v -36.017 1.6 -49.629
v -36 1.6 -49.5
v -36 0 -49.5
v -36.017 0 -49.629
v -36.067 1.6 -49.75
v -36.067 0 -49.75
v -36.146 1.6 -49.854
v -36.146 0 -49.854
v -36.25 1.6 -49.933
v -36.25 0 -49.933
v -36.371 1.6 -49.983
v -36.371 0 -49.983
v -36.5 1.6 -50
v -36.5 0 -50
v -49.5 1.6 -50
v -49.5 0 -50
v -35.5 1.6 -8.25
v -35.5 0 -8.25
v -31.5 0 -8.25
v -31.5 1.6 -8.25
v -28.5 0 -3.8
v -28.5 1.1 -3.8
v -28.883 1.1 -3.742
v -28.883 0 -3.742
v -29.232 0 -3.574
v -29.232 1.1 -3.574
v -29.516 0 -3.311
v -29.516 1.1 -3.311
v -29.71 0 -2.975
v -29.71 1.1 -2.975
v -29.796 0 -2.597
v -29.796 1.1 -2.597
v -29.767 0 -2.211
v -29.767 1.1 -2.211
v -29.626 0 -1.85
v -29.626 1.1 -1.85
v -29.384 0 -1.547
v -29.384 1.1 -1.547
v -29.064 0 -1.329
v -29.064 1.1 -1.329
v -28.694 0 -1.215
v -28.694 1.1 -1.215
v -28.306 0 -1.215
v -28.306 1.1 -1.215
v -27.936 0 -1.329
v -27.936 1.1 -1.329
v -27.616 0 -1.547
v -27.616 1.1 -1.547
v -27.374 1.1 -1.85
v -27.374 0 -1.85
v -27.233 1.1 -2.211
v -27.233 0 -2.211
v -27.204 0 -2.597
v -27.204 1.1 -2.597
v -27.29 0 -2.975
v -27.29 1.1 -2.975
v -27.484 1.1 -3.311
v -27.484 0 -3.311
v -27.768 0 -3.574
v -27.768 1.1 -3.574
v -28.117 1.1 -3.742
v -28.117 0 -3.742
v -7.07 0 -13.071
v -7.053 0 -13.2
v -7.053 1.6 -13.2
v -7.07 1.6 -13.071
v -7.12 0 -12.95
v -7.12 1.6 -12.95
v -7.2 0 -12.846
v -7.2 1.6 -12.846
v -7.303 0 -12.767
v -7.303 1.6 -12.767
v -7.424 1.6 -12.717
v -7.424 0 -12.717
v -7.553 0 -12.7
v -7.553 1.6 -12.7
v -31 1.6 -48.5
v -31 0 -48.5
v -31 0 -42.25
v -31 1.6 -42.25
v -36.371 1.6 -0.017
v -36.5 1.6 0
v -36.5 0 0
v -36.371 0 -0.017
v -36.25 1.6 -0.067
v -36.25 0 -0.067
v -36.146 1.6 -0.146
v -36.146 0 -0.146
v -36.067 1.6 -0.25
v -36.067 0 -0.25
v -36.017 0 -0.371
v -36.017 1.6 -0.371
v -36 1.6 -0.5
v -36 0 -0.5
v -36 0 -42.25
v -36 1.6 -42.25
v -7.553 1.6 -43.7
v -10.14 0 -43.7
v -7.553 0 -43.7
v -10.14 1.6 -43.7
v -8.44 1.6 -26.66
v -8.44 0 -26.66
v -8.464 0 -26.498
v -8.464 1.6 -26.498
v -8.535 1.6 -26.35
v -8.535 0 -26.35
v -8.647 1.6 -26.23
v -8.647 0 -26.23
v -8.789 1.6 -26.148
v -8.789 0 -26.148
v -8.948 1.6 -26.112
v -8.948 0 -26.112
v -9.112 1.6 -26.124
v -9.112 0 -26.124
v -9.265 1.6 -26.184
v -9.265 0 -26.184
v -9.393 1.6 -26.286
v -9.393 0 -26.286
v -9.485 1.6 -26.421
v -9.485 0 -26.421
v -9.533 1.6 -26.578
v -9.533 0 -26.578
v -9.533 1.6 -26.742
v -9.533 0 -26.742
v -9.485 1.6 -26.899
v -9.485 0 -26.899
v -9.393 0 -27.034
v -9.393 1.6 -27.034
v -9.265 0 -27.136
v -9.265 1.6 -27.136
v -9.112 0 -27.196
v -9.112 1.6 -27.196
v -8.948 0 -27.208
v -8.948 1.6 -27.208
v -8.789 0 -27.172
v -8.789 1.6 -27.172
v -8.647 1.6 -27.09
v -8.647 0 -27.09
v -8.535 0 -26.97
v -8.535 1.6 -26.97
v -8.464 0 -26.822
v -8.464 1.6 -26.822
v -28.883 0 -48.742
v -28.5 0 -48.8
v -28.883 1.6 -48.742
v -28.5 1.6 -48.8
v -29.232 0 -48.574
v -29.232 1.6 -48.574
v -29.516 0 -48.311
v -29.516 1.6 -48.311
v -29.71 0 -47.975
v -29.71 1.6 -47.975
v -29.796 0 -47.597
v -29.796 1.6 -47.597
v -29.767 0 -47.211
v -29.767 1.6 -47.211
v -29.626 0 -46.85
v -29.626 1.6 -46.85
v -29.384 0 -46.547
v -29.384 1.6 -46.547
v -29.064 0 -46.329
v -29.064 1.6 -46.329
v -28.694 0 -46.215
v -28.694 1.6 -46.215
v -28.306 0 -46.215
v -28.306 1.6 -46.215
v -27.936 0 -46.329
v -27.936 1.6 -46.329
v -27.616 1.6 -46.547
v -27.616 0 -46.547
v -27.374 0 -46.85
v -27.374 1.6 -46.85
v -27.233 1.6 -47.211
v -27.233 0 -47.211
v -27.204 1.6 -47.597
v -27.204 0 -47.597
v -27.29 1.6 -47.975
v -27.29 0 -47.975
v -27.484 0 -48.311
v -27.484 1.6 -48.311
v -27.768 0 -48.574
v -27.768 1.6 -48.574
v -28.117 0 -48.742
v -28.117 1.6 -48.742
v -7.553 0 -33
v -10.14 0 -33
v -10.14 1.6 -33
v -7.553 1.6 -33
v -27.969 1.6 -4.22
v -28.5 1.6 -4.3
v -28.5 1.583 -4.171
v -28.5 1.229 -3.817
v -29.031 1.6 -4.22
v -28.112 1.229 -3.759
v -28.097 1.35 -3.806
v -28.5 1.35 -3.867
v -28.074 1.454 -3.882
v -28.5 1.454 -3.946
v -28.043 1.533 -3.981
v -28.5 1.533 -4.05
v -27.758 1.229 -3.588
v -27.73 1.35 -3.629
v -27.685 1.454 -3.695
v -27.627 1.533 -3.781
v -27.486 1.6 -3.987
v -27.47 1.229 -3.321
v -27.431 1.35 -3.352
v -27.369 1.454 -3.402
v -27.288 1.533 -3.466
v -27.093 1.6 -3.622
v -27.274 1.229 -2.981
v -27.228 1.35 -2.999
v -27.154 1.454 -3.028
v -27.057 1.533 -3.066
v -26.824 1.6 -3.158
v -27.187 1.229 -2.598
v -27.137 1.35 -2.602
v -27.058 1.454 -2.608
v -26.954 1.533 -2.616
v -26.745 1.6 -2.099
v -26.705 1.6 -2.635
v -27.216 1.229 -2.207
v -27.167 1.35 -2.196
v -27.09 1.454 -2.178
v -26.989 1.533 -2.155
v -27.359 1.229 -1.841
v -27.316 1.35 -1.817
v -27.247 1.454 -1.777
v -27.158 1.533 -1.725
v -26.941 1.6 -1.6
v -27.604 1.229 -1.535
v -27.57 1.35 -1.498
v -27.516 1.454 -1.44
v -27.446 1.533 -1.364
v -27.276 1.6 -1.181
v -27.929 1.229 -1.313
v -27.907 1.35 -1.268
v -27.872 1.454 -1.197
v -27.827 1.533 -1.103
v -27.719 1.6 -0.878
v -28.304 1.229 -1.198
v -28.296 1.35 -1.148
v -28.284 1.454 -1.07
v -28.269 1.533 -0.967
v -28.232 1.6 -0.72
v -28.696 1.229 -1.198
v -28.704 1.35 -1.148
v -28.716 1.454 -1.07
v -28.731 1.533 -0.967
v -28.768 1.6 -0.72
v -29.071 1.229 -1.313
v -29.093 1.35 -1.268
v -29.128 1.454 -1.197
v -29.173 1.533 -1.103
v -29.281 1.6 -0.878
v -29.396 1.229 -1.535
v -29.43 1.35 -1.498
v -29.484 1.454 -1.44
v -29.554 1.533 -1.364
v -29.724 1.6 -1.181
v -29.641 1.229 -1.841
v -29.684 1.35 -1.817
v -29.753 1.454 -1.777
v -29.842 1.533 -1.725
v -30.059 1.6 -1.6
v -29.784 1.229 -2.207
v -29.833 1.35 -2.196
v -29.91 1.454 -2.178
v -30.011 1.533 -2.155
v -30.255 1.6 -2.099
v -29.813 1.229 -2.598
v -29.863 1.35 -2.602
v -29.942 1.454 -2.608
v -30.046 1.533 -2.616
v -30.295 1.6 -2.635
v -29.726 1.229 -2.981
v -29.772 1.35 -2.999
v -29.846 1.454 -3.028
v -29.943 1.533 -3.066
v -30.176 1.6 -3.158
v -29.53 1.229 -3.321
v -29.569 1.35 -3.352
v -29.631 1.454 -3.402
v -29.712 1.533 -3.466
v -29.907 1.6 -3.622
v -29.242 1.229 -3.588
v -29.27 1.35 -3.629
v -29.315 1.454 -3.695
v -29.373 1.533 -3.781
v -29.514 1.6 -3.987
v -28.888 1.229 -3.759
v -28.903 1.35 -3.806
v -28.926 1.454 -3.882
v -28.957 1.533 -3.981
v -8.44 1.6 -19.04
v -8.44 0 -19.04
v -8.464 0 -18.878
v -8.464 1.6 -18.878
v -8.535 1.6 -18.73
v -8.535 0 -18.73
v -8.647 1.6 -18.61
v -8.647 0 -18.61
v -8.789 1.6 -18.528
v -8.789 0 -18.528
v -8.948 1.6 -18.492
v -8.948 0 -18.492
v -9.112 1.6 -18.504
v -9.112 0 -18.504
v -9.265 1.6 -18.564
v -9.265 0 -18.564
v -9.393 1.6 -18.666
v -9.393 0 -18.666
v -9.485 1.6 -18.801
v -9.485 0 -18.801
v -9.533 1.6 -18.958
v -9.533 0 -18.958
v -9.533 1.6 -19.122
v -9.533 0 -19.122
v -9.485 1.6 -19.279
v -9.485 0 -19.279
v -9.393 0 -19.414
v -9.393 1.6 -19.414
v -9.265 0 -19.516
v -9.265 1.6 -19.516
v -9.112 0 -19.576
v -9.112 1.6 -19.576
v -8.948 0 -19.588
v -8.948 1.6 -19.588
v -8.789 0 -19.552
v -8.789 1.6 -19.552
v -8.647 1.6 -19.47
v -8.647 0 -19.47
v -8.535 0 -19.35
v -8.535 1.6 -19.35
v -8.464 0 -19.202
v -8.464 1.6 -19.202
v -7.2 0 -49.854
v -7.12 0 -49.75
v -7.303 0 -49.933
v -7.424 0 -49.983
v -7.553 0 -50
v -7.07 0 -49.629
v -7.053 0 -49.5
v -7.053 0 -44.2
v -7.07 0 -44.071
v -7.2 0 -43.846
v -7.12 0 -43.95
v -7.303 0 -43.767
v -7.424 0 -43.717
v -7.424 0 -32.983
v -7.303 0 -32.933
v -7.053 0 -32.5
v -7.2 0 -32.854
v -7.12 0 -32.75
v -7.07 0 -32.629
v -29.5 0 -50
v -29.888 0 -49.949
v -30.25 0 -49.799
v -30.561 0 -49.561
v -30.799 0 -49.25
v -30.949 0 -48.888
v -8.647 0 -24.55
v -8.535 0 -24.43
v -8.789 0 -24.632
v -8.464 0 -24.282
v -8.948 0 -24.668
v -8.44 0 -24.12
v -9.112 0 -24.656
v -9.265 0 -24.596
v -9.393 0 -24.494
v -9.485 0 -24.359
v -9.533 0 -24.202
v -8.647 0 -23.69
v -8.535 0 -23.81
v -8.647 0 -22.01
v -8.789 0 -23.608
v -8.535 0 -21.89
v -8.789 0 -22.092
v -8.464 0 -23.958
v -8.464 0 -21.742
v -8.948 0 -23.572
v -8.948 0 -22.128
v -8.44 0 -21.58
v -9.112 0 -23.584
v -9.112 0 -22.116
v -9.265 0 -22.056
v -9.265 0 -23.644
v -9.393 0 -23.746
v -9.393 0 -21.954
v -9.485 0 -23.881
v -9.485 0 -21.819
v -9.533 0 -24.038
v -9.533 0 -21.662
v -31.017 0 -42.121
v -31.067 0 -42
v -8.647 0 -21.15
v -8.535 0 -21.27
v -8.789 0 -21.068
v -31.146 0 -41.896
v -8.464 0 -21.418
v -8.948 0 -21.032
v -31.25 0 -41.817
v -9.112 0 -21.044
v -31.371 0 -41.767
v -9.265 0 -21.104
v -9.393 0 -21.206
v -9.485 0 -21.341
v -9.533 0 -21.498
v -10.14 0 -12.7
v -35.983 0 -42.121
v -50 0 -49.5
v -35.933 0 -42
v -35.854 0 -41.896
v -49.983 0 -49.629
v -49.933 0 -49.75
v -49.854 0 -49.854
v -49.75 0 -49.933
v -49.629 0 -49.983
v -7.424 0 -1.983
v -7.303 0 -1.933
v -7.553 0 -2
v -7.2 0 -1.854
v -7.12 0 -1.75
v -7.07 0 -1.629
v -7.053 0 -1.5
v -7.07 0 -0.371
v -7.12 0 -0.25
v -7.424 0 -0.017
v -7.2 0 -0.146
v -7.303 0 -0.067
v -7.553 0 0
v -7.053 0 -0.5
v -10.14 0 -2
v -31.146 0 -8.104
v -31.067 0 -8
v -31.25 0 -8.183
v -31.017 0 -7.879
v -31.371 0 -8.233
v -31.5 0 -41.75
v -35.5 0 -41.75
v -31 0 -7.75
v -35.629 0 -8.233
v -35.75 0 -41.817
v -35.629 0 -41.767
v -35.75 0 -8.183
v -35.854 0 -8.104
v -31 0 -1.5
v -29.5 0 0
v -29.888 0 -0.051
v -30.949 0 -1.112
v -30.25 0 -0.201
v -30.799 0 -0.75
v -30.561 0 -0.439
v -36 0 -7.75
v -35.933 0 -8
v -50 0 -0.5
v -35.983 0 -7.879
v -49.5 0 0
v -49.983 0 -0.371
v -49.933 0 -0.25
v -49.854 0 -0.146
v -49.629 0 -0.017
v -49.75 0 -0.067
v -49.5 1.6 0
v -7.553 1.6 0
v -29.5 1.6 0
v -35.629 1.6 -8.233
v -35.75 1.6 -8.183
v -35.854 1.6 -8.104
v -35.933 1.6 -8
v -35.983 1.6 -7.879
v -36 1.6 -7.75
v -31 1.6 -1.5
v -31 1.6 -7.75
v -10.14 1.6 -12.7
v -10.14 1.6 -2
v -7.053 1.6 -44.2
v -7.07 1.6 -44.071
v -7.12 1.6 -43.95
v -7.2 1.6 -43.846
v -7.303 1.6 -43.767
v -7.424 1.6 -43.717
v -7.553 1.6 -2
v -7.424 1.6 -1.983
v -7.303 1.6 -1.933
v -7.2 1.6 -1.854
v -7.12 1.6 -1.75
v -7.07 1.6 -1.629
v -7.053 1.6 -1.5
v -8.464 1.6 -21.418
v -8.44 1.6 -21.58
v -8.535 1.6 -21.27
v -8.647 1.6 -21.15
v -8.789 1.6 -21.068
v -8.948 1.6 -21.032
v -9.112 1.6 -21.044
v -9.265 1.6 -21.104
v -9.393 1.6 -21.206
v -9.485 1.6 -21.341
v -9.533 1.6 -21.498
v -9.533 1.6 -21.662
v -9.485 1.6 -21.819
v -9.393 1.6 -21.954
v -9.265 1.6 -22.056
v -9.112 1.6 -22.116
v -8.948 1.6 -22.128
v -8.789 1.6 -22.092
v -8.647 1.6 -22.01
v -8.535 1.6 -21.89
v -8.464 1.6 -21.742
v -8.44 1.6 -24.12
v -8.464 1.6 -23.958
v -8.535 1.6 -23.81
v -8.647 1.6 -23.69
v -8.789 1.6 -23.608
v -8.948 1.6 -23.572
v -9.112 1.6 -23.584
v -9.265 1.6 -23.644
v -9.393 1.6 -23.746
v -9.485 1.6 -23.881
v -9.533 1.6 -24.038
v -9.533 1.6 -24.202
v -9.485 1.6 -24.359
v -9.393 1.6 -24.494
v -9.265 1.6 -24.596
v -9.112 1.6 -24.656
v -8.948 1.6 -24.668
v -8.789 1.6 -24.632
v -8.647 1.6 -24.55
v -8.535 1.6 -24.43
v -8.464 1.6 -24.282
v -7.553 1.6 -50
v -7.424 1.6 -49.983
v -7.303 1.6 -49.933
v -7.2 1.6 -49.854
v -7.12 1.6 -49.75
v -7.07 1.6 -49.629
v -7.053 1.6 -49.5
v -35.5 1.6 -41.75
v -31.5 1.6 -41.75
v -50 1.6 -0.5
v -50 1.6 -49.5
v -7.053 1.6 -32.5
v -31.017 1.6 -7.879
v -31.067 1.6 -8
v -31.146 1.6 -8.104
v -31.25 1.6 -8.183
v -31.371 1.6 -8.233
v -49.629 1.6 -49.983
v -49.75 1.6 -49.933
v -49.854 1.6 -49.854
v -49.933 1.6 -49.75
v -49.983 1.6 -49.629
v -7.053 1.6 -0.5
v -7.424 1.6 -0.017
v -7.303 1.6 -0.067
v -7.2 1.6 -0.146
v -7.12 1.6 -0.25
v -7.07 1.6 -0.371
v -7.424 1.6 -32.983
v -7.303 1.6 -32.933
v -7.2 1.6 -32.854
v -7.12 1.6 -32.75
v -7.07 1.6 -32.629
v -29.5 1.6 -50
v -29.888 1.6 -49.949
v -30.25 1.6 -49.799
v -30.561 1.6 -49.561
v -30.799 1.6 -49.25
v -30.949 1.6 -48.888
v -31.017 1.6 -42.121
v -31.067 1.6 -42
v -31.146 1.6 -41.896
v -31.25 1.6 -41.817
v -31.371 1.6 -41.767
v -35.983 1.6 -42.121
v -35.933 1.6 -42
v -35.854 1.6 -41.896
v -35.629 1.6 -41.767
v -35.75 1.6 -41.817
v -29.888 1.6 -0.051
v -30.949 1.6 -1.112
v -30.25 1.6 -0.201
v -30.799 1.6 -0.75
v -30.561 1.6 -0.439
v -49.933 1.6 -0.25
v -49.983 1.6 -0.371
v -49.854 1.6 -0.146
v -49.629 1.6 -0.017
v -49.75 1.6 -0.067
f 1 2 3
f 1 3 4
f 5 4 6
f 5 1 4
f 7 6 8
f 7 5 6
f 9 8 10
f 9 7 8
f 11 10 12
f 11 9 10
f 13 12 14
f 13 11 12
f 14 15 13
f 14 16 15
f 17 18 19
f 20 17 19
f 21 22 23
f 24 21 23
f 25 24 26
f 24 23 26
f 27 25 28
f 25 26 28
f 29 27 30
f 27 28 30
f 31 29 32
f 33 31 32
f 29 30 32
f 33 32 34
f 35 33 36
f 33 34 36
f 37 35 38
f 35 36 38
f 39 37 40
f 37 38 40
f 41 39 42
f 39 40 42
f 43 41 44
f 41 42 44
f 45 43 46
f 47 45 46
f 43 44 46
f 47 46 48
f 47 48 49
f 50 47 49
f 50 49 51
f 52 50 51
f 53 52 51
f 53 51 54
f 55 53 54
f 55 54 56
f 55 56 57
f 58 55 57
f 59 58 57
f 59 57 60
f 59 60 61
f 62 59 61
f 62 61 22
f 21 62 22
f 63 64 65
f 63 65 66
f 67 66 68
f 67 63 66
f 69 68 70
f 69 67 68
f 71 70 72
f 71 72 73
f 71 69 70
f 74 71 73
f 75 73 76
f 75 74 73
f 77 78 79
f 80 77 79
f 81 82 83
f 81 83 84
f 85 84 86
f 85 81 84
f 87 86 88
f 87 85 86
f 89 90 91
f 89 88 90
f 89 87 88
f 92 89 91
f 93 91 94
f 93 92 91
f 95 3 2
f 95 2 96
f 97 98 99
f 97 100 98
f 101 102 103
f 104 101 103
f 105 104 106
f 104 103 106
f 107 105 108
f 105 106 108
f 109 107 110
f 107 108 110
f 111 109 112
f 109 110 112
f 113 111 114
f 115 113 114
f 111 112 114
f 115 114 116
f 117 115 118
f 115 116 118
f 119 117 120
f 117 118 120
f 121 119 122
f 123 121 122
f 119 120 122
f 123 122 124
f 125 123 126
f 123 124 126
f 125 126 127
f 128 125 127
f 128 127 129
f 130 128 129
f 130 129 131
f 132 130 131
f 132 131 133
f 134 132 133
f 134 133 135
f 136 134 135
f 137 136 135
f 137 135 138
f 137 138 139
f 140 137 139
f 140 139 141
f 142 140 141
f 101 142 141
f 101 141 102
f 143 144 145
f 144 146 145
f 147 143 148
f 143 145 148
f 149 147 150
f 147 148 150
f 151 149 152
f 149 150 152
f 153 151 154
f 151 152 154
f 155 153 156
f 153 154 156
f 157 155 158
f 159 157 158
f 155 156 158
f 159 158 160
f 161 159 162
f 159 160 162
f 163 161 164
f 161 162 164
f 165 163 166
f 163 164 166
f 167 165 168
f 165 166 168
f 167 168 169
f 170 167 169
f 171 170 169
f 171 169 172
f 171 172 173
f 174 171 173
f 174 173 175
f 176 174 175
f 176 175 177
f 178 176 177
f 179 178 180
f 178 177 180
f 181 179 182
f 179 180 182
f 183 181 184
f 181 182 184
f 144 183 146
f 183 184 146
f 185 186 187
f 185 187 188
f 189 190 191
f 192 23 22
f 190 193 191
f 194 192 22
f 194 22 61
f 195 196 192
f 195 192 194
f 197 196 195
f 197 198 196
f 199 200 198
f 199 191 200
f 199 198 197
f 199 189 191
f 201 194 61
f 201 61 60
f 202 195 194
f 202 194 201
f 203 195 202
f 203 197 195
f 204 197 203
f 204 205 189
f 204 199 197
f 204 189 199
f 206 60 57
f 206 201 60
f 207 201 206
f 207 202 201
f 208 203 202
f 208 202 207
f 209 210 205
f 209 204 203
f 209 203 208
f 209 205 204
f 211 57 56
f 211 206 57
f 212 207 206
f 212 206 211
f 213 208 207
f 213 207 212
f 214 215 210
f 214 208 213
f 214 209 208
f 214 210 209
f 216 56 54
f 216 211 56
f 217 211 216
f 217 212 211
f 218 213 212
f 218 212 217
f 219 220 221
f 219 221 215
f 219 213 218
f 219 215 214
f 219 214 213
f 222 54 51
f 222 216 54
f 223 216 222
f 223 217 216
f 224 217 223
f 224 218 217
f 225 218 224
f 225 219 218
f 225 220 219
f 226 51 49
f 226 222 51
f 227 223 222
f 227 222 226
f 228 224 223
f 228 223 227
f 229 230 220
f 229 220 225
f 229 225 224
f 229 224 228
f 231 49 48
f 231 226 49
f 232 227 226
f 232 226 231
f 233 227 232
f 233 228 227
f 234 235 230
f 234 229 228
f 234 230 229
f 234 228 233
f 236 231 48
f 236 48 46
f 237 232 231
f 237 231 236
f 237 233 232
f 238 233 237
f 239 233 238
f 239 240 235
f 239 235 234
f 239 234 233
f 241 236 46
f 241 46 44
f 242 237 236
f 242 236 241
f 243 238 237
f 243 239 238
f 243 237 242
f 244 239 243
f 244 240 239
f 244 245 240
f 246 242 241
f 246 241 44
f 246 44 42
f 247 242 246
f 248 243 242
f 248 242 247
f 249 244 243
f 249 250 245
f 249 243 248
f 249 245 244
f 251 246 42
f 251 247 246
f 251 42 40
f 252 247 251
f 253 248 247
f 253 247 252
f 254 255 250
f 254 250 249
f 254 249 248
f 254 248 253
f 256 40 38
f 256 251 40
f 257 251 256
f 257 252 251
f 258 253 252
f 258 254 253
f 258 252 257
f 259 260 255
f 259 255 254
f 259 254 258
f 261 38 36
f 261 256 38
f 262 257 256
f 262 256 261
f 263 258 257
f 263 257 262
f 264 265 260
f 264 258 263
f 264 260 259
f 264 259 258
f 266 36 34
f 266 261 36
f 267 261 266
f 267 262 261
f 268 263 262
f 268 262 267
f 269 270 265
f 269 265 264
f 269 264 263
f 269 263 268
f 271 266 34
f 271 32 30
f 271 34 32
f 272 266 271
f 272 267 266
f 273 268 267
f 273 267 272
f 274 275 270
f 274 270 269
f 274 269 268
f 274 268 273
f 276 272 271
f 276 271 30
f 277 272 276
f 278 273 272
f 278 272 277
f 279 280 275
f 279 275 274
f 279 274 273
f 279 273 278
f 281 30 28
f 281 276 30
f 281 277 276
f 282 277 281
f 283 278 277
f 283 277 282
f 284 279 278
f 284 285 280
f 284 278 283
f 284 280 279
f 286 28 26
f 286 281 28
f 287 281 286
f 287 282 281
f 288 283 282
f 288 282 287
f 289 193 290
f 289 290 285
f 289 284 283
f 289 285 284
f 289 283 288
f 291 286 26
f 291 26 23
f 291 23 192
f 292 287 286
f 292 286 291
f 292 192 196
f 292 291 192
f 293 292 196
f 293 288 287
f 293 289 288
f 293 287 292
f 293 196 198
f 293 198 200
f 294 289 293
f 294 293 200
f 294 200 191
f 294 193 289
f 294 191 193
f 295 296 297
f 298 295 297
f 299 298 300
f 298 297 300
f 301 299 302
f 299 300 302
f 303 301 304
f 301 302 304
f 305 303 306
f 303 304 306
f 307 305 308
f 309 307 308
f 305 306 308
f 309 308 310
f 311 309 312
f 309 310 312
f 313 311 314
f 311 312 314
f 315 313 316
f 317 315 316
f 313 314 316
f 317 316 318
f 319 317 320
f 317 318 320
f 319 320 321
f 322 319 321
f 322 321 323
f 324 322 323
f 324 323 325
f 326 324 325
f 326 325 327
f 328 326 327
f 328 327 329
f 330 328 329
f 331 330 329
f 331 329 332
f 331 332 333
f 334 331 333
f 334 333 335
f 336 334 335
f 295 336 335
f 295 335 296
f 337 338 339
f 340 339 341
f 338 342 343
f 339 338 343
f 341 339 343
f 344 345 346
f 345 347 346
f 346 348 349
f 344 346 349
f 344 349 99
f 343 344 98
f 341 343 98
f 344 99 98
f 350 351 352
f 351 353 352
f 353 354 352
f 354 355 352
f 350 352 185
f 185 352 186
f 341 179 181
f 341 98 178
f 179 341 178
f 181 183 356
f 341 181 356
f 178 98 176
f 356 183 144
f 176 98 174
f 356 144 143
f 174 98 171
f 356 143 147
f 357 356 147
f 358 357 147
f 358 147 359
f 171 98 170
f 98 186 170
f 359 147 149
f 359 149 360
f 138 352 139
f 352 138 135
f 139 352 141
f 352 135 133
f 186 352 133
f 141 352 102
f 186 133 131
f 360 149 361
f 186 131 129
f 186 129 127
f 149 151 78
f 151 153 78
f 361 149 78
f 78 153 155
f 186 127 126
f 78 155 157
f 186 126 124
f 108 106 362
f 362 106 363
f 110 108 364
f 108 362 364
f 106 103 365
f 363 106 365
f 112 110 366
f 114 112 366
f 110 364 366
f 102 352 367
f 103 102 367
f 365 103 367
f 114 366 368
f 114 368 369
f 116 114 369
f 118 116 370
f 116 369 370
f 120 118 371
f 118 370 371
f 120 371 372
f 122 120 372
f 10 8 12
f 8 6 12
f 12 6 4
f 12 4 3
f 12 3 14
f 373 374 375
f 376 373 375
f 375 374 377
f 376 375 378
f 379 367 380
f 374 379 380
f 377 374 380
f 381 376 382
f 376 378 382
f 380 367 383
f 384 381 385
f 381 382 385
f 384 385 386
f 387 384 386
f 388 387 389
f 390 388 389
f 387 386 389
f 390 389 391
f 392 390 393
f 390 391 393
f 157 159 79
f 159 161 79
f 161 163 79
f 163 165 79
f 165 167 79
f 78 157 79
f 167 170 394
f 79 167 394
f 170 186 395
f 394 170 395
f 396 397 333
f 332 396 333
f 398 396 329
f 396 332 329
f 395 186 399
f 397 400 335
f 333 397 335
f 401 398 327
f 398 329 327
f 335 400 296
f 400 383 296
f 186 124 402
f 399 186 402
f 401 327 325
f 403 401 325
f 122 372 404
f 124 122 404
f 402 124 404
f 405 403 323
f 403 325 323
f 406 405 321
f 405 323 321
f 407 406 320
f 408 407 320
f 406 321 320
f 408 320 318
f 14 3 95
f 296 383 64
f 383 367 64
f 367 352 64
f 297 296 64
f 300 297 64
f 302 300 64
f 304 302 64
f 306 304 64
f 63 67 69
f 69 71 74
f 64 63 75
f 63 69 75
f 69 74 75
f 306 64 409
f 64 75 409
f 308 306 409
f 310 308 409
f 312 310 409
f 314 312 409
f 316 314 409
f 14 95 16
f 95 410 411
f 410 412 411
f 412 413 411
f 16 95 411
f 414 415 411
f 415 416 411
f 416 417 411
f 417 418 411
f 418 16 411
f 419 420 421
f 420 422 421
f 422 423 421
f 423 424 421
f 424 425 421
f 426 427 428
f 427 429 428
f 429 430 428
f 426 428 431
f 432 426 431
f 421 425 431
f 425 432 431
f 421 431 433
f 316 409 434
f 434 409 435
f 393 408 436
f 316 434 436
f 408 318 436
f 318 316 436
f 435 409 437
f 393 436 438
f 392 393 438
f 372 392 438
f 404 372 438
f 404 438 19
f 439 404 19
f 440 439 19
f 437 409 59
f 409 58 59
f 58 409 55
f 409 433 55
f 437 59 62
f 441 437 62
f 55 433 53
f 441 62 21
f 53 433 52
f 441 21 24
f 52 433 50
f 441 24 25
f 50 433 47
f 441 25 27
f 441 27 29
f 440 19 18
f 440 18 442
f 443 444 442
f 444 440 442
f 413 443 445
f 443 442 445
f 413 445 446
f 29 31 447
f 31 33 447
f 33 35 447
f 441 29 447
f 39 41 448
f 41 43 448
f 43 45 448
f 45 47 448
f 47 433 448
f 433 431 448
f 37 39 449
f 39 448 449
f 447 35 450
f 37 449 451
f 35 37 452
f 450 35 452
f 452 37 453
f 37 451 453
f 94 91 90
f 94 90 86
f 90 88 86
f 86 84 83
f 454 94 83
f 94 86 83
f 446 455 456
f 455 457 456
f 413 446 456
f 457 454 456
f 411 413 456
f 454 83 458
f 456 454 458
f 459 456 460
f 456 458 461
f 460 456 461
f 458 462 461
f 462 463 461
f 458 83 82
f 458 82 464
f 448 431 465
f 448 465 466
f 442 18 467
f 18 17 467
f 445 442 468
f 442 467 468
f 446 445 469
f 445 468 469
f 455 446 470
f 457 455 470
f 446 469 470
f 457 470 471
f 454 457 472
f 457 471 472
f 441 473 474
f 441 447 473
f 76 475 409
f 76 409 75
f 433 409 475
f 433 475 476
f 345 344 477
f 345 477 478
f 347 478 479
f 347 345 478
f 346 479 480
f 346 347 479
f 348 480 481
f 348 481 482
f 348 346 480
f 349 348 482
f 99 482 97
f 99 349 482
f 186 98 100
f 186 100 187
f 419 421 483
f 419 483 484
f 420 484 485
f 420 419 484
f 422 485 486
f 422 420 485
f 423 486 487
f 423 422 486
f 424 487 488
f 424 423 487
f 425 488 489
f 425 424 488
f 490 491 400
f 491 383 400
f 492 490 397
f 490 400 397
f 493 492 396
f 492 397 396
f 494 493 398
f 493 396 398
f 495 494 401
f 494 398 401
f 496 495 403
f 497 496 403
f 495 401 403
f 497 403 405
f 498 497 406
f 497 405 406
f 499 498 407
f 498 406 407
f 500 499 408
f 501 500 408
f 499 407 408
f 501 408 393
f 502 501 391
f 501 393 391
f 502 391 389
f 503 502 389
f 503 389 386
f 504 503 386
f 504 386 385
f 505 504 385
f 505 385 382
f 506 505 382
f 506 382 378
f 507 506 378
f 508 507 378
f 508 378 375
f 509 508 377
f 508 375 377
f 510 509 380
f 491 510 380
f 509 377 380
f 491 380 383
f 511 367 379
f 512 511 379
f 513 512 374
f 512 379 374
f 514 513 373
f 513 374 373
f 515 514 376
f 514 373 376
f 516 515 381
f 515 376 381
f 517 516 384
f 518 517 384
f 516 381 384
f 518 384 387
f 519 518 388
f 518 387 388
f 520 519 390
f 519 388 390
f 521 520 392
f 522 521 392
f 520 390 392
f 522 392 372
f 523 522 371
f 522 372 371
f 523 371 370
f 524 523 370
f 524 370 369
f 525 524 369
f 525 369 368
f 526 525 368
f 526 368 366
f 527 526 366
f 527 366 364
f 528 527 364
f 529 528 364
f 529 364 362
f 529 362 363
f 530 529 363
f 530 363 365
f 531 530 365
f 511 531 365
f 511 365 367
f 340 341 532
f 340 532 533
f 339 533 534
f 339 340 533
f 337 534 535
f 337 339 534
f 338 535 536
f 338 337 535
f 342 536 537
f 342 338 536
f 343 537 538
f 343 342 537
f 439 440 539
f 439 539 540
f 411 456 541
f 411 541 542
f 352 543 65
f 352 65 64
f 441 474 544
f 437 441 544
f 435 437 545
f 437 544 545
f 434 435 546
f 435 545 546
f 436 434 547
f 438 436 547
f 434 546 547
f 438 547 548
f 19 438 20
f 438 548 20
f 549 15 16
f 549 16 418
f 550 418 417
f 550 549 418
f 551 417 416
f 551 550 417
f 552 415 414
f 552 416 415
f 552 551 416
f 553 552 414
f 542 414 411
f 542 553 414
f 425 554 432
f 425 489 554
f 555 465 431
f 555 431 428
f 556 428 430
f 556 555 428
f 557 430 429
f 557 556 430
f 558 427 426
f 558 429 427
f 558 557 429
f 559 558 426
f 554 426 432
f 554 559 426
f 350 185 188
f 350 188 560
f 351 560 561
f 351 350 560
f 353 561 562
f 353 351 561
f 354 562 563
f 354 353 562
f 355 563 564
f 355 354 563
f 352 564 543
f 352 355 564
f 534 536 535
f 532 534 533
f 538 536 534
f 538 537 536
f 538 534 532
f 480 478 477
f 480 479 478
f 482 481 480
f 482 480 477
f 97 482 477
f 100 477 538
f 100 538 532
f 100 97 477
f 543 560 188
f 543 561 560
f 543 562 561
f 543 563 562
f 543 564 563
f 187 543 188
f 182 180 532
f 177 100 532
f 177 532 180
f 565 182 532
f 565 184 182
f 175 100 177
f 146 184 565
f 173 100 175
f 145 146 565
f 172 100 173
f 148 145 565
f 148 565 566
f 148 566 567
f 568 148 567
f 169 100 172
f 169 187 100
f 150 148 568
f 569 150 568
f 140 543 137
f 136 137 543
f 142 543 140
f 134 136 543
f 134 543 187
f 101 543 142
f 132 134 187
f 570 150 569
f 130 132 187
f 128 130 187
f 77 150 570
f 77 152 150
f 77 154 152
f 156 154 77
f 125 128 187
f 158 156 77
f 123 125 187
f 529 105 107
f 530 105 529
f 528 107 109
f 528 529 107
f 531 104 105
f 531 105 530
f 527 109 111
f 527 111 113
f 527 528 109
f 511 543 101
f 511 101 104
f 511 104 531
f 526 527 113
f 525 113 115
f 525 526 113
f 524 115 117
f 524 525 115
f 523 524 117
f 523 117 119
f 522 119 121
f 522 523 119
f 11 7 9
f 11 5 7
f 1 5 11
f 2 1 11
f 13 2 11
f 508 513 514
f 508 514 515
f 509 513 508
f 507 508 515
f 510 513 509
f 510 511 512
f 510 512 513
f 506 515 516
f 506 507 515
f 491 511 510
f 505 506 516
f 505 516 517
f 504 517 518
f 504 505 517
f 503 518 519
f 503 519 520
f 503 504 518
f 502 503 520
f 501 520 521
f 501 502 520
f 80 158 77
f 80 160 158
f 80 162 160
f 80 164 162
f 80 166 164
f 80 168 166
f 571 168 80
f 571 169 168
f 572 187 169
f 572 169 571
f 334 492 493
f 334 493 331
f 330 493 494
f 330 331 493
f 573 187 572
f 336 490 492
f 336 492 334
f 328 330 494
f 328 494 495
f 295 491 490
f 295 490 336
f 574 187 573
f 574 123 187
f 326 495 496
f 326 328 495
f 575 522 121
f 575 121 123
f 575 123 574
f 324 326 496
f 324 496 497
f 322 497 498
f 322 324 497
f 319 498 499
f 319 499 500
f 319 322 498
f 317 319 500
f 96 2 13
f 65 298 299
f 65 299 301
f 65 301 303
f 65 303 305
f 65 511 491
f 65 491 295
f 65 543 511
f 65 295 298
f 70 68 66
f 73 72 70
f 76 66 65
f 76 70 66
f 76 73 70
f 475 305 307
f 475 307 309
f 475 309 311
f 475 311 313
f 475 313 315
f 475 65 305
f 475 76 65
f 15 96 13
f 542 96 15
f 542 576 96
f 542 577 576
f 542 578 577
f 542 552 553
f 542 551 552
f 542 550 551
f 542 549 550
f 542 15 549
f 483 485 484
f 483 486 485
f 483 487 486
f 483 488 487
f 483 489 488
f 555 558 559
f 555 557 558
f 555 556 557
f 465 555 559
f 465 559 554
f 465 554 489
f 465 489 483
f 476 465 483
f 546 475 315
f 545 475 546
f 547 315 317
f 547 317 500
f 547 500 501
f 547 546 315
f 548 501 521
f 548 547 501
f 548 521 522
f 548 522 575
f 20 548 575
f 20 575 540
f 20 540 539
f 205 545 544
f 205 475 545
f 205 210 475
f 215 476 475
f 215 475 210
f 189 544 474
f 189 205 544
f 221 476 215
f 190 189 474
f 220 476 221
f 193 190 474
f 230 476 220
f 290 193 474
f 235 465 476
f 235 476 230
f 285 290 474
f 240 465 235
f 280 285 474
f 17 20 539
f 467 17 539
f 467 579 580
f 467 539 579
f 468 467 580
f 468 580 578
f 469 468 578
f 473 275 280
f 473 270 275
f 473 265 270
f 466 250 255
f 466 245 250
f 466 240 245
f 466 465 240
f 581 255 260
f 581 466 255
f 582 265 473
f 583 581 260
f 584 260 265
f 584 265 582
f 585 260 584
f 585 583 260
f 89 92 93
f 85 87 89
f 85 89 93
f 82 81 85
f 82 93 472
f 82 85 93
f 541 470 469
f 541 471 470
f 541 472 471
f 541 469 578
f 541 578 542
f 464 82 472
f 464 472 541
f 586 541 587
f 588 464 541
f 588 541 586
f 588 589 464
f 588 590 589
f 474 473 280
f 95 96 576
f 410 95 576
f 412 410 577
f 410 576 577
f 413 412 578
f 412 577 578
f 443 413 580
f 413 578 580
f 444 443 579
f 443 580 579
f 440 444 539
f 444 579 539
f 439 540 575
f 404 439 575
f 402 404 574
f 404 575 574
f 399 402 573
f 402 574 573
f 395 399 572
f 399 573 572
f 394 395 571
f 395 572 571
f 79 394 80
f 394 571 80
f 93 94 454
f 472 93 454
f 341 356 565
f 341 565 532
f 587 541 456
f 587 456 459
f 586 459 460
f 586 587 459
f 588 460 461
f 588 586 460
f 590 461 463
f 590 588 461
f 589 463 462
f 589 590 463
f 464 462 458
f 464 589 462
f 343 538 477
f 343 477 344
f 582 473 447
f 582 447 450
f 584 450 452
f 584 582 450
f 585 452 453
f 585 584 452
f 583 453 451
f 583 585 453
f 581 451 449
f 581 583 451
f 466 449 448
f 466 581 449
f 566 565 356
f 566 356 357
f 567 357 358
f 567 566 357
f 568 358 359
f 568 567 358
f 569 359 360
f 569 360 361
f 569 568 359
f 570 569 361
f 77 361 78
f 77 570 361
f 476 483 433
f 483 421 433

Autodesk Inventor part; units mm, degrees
ref_plane "YZ Plane" through (0, 0, 0) normal (1, 0, 0) x (0, 1, 0)
ref_plane "XZ Plane" through (0, 0, 0) normal (0, 1, 0) x (-1, 0, 0)
ref_plane "XY Plane" through (0, 0, 0) normal (0, 0, 1) x (1, 0, 0)
sketch "Szkic1" plane through (0, 0, 0) normal (0, 1, 0) x (-1, 0, 0)
  line L0 (0, 0) -> (50, 0)
  line L1 (50, 0) -> (50, -50)
  line L2 (50, -50) -> (0, -50)
  line L3 (0, -50) -> (0, 0)
  dimension "d0" = 50
  dimension "d1" = 50
extrude "Wyciągnięcie proste1" add sketch "Szkic1" along normal blind 1.6
sketch "Szkic2" plane through (-50, 0, 0) normal (0, 0, 1) x (1, 0, 0)
  line L0 (0, 0) -> (50, 0) projected
  line L1 (50, 0) -> (50, 1.6) projected
  line L2 (0, 1.6) -> (50, 1.6) projected
  line L3 (0, 0) -> (0, 1.6) projected
  line L4 (47.9294, 17.85) -> (42.5705, -2.15) projected
  line L5 (42.5705, -2.15) -> (44.641, -2.15) projected
  line L6 (44.641, -2.15) -> (50, 17.85) projected
  line L7 (50, 17.85) -> (47.9294, 17.85) projected
  point P0 (43.5753, 1.6)
  point P1 (43.1466, 0)
extrude "Wyciągnięcie proste2" cut sketch "Szkic2" against normal through all contours L4 L2 L6 L0 | L6 L2 L1 L0
sketch "Szkic3" plane through (0, 0, 0) normal (0, -1, 0) x (1, 0, 0)
  line L0 (-8.5941, -2) -> (-8.5941, -12.7) projected
  line L1 (-8.5941, -2) -> (-10.1396, -2) projected
  line L2 (-10.1396, -12.7) -> (-10.1396, -2) projected
  line L3 (-8.5941, -12.7) -> (-10.1396, -12.7) projected
  line L4 (-10.1396, -12.7) -> (-7.8396, -12.7)
  line L5 (-7.8396, -12.7) -> (-7.8396, -2)
  line L6 (-7.8396, -2) -> (-10.1396, -2)
  line L7 (-10.1396, -2) -> (-10.1396, -12.7)
  line L8 (-8.5941, -33) -> (-8.5941, -43.7) projected
  line L9 (-8.5941, -33) -> (-10.1396, -33) projected
  line L10 (-10.1396, -43.7) -> (-10.1396, -33) projected
  line L11 (-8.5941, -43.7) -> (-10.1396, -43.7) projected
  line L12 (-10.1396, -33) -> (-7.8396, -33)
  line L13 (-7.8396, -33) -> (-7.8396, -43.7)
  line L14 (-7.8396, -43.7) -> (-10.1396, -43.7)
  line L15 (-10.1396, -43.7) -> (-10.1396, -33)
  point P0 (0, 0)
  dimension "d6" = 2.3
  dimension "d7" = 2.3
extrude "Wyciągnięcie proste3" cut sketch "Szkic3" against normal through all
sketch "Szkic4" plane through (0, 0, 0) normal (0, -1, 0) x (1, 0, 0)
  line L0 (-10.1396, -33) -> (-7.8396, -33) projected
  line L1 (-7.8396, -12.7) -> (-10.1396, -12.7) projected
  line L2 (-8.9896, -12.7) -> (-8.9896, -33) construction
  circle A0 centre (-8.9896, -26.66) radius 0.55
  circle A1 centre (-8.9896, -24.12) radius 0.55
  circle A2 centre (-8.9896, -21.58) radius 0.55
  circle A3 centre (-8.9896, -19.04) radius 0.55
  point P0 (0, 0)
  dimension "d10" = 1.1
  dimension "d14" = 2.54
  dimension "d19" = 6.34
extrude "Wyciągnięcie proste4" cut sketch "Szkic4" against normal through all
sketch "Szkic5" plane through (0, 0, 0) normal (0, -1, 0) x (1, 0, 0)
  line L0 (-50, -50) -> (-50, 0) projected
  circle A0 centre (-8.9896, -21.58) radius 0.55 projected
  circle A1 centre (-8.9896, -24.12) radius 0.55 projected
  circle A2 centre (-8.9896, -19.04) radius 0.55 projected
  circle A3 centre (-8.9896, -26.66) radius 0.55 projected
  line L1 (-10.1396, -12.7) -> (-10.1396, -2) projected
  line L2 (-10.1396, -2) -> (-7.8396, -2) projected
  line L3 (-7.8396, -2) -> (-7.8396, -12.7) projected
  line L4 (-7.8396, -12.7) -> (-10.1396, -12.7) projected
  line L5 (-10.1396, -43.7) -> (-10.1396, -33) projected
  line L6 (-10.1396, -33) -> (-7.8396, -33) projected
  line L7 (-7.8396, -33) -> (-7.8396, -43.7) projected
  line L8 (-7.8396, -43.7) -> (-10.1396, -43.7) projected
  line L9 (-6.8534, -50) -> (-6.8534, 0) projected
  line L10 (-50, 0) -> (-6.8534, 0) projected
  line L11 (-50, -50) -> (-50, 0) projected
  line L12 (-6.8534, -50) -> (-50, -50) projected
  line L13 (-50, -50) -> (-50, 0) projected
  line L14 (-50, -25) -> (-6.8534, -25)
  line L15 (-34, -48.25) -> (-34, -43.25) projected
  line L16 (-32, -48.25) -> (-34, -48.25) projected
  line L17 (-32, -43.25) -> (-32, -48.25) projected
  line L18 (-34, -43.25) -> (-32, -43.25) projected
  line L19 (-30.5, -46.7732) -> (-30.5, -50) projected
  line L20 (-36, -50) -> (-50, -50) projected
  line L21 (-28, -36) -> (-45.016, -36) projected
  line L22 (-30.5, -50) -> (-36, -50)
  line L23 (-36, -50) -> (-36, -41.75)
  line L24 (-36, -41.75) -> (-30.5, -41.75)
  line L25 (-30.5, -41.75) -> (-30.5, -50)
  line L26 (-36, 0) -> (-36, -8.25)
  line L27 (-36, -8.25) -> (-30.5, -8.25)
  line L28 (-30.5, -8.25) -> (-30.5, 0)
  point P0 (0, 0)
  dimension "d22" = 2
  dimension "d23" = 1.5
extrude "Wyciągnięcie proste5" cut sketch "Szkic5" against normal through all contours L23 L24 L25 L19 L12 | L10 L28 L27 L26 | L15 L18 L17 L16
fillet "Zaokrąglenie2" radius 0.5 2 edges at (-50, 0.8, 0) (-50, 0.8, -50)
sketch "Szkic7" plane through (-6.8534, 0, -50) normal (0, 0, -1) x (-1, 0, 0)
  line L0 (-0.4287, 1.6) -> (23.6466, 1.6) projected
  line L1 (-0.4287, 1.6) -> (0, 0) projected
  line L2 (0, 0) -> (23.6466, 0) projected
  line L3 (0, 0) -> (0, 1.6)
  line L4 (0.2, 1.6) -> (0.2, 0)
  line L5 (23.6466, 0) -> (23.6466, 1.6) projected
  line L6 (42.6466, 1.6) -> (42.6466, 0) projected
  line L7 (29.1466, 1.6) -> (42.6466, 1.6) projected
  line L8 (29.1466, 1.6) -> (29.1466, 0) projected
  line L9 (29.1466, 0) -> (42.6466, 0) projected
  point P0 (-6.8534, 0)
  dimension "d30" = 0.2
extrude "Wyciągnięcie proste7" cut sketch "Szkic7" against normal through all contours L0 L3 L1 | L0 L4 L2 L3
sketch "Szkic9" plane through (0, 1.6, 0) normal (0, 1, 0) x (1, 0, 0)
  circle A0 centre (-8.9896, 21.58) radius 0.55 projected
  circle A1 centre (-8.9896, 24.12) radius 0.55 projected
  circle A2 centre (-8.9896, 19.04) radius 0.55 projected
  circle A3 centre (-8.9896, 26.66) radius 0.55 projected
  line L0 (-10.1396, 2) -> (-10.1396, 12.7) projected
  line L1 (-10.1396, 12.7) -> (-7.8396, 12.7) projected
  line L2 (-7.8396, 12.7) -> (-7.8396, 2) projected
  line L3 (-7.8396, 2) -> (-10.1396, 2) projected
  line L4 (-10.1396, 33) -> (-10.1396, 43.7) projected
  line L5 (-10.1396, 43.7) -> (-7.8396, 43.7) projected
  line L6 (-7.8396, 43.7) -> (-7.8396, 33) projected
  line L7 (-7.8396, 33) -> (-10.1396, 33) projected
  line L8 (-7.0534, 0) -> (-7.0534, 50) projected
  line L9 (-7.0534, 50) -> (-30.5, 50) projected
  line L10 (-30.5, 50) -> (-30.5, 41.75) projected
  line L11 (-30.5, 41.75) -> (-36, 41.75) projected
  line L12 (-36, 41.75) -> (-36, 50) projected
  line L13 (-36, 50) -> (-49.5, 50) projected
  arc A4 (-49.5, 50) -> (-50, 49.5) centre (-49.5, 49.5) ccw projected
  line L14 (-50, 49.5) -> (-50, 0.5) projected
  arc A5 (-50, 0.5) -> (-49.5, 0) centre (-49.5, 0.5) ccw projected
  line L15 (-49.5, 0) -> (-36, 0) projected
  line L16 (-36, 0) -> (-36, 8.25) projected
  line L17 (-36, 8.25) -> (-30.5, 8.25) projected
  line L18 (-30.5, 8.25) -> (-30.5, 0) projected
  line L19 (-30.5, 0) -> (-7.0534, 0) projected
  line L20 (-10.1396, 12.7) -> (-7.0534, 12.7)
  line L21 (-7.0534, 12.7) -> (-7.0534, 2)
  line L22 (-7.0534, 2) -> (-10.1396, 2)
  line L23 (-10.1396, 2) -> (-10.1396, 12.7)
  line L24 (-10.1396, 43.7) -> (-7.0534, 43.7)
  line L25 (-7.0534, 43.7) -> (-7.0534, 33)
  line L26 (-7.0534, 33) -> (-10.1396, 33)
  line L27 (-10.1396, 33) -> (-10.1396, 43.7)
  point P0 (0, 0)
  point P1 (-7.8396, 2)
extrude "Wyciągnięcie proste8" cut sketch "Szkic9" against normal through all contours L2 L20 L8 L22 | L26 L6 L24 L8
fillet "Zaokrąglenie3" radius 0.5 6 edges at (-7.0534, 0.8, -12.7) (-7.0534, 0.8, -33) (-7.0534, 0.8, -43.7) (-7.0534, 0.8, -50) (-7.0534, 0.8, -2) (-7.0534, 0.8, 0)
sketch "Szkic11" plane through (0, 0, 0) normal (0, -1, 0) x (1, 0, 0)
  arc A0 (-7.0534, -0.5) -> (-7.5534, 0) centre (-7.5534, -0.5) ccw projected
  line L0 (-30.5, 0) -> (-7.5534, 0) projected
  line L1 (-30.5, 0) -> (-30.5, -8.25) projected
  line L2 (-30.5, -8.25) -> (-36, -8.25) projected
  line L3 (-36, -8.25) -> (-36, 0) projected
  line L4 (-49.5, 0) -> (-36, 0) projected
  arc A1 (-49.5, 0) -> (-50, -0.5) centre (-49.5, -0.5) ccw projected
  line L5 (-50, -49.5) -> (-50, -0.5) projected
  arc A2 (-50, -49.5) -> (-49.5, -50) centre (-49.5, -49.5) ccw projected
  line L6 (-36, -50) -> (-49.5, -50) projected
  line L7 (-36, -50) -> (-36, -41.75) projected
  line L8 (-36, -41.75) -> (-30.5, -41.75) projected
  line L9 (-30.5, -41.75) -> (-30.5, -50) projected
  line L10 (-7.5534, -50) -> (-30.5, -50) projected
  arc A3 (-7.5534, -50) -> (-7.0534, -49.5) centre (-7.5534, -49.5) ccw projected
  line L11 (-7.0534, -49.5) -> (-7.0534, -44.2) projected
  arc A4 (-7.0534, -44.2) -> (-7.5534, -43.7) centre (-7.5534, -44.2) ccw projected
  line L12 (-7.5534, -43.7) -> (-10.1396, -43.7) projected
  line L13 (-10.1396, -43.7) -> (-10.1396, -33) projected
  line L14 (-10.1396, -33) -> (-7.5534, -33) projected
  arc A5 (-7.5534, -33) -> (-7.0534, -32.5) centre (-7.5534, -32.5) ccw projected
  line L15 (-7.0534, -32.5) -> (-7.0534, -13.2) projected
  arc A6 (-7.0534, -13.2) -> (-7.5534, -12.7) centre (-7.5534, -13.2) ccw projected
  line L16 (-7.5534, -12.7) -> (-10.1396, -12.7) projected
  line L17 (-10.1396, -12.7) -> (-10.1396, -2) projected
  line L18 (-10.1396, -2) -> (-7.5534, -2) projected
  arc A7 (-7.5534, -2) -> (-7.0534, -1.5) centre (-7.5534, -1.5) ccw projected
  line L19 (-7.0534, -1.5) -> (-7.0534, -0.5) projected
  circle A8 centre (-8.9896, -26.66) radius 0.55 projected
  circle A9 centre (-8.9896, -19.04) radius 0.55 projected
  circle A10 centre (-8.9896, -24.12) radius 0.55 projected
  circle A11 centre (-8.9896, -21.58) radius 0.55 projected
  line L20 (-30.5, 0) -> (-31, 0)
  line L21 (-31, 0) -> (-31, -8.25)
  line L22 (-31, -8.25) -> (-30.5, -8.25)
  line L23 (-30.5, -8.25) -> (-30.5, 0)
  line L24 (-30.5, -50) -> (-31, -50)
  line L25 (-31, -50) -> (-31, -41.75)
  line L26 (-31, -41.75) -> (-30.5, -41.75)
  line L27 (-30.5, -41.75) -> (-30.5, -50)
  point P0 (0, 0)
  dimension "d40" = 0.5
  dimension "d41" = 0.5
extrude "Wyciągnięcie proste10" add sketch "Szkic11" against normal up to surface (1.6 mm away) contours L1 L2 L21 L20 | L8 L9 L24 L25
fillet "Zaokrąglenie4" radius 1.5 2 edges at (-31, 0.8, -50) (-31, 0.8, 0)
fillet "Zaokrąglenie5" radius 0.5 6 edges at (-31, 0.8, -8.25) (-36, 0.8, -8.25) (-36, 0.8, 0) (-36, 0.8, -50) (-36, 0.8, -41.75) (-31, 0.8, -41.75)
sketch "Szkic13" plane through (0, 0, 0) normal (0, -1, 0) x (1, 0, 0)
  circle A0 centre (-28.5, -2.5) radius 1 projected
  circle A1 centre (-28.5, -47.5) radius 1 projected
  point P0 (0, 0)
hole "Otwór2" at (-28.5, 0, -2.5) at (-28.5, 0, -47.5) direction (0, 1, 0) diameter 2.6 end through all
fillet "Zaokrąglenie6" radius 0.5 1 edges at (-28.5, 1.6, -1.2)
sketch "Szkic14" plane through (0, 0, 0) normal (0, -1, 0) x (1, 0, 0)
  circle A0 centre (-28.5, -2.5) radius 1.3 projected
  circle A1 centre (-28.5, -47.5) radius 1.3 projected
  arc A2 (-36.5, -50) -> (-36, -49.5) centre (-36.5, -49.5) ccw projected
  line L0 (-36, -49.5) -> (-36, -42.25) projected
  arc A3 (-35.5, -41.75) -> (-36, -42.25) centre (-35.5, -42.25) ccw projected
  line L1 (-35.5, -41.75) -> (-31.5, -41.75) projected
  arc A4 (-31, -42.25) -> (-31.5, -41.75) centre (-31.5, -42.25) ccw projected
  line L2 (-31, -42.25) -> (-31, -48.5) projected
  arc A5 (-31, -48.5) -> (-29.5, -50) centre (-29.5, -48.5) ccw projected
  line L3 (-29.5, -50) -> (-7.5534, -50) projected
  arc A6 (-7.5534, -50) -> (-7.0534, -49.5) centre (-7.5534, -49.5) ccw projected
  line L4 (-7.0534, -49.5) -> (-7.0534, -44.2) projected
  arc A7 (-7.0534, -44.2) -> (-7.5534, -43.7) centre (-7.5534, -44.2) ccw projected
  line L5 (-7.5534, -43.7) -> (-10.1396, -43.7) projected
  line L6 (-10.1396, -43.7) -> (-10.1396, -33) projected
  line L7 (-10.1396, -33) -> (-7.5534, -33) projected
  arc A8 (-7.5534, -33) -> (-7.0534, -32.5) centre (-7.5534, -32.5) ccw projected
  line L8 (-7.0534, -32.5) -> (-7.0534, -13.2) projected
  arc A9 (-7.0534, -13.2) -> (-7.5534, -12.7) centre (-7.5534, -13.2) ccw projected
  line L9 (-7.5534, -12.7) -> (-10.1396, -12.7) projected
  line L10 (-10.1396, -12.7) -> (-10.1396, -2) projected
  line L11 (-10.1396, -2) -> (-7.5534, -2) projected
  arc A10 (-7.5534, -2) -> (-7.0534, -1.5) centre (-7.5534, -1.5) ccw projected
  line L12 (-7.0534, -1.5) -> (-7.0534, -0.5) projected
  arc A11 (-7.0534, -0.5) -> (-7.5534, 0) centre (-7.5534, -0.5) ccw projected
  line L13 (-29.5, 0) -> (-7.5534, 0) projected
  arc A12 (-29.5, 0) -> (-31, -1.5) centre (-29.5, -1.5) ccw projected
  line L14 (-31, -1.5) -> (-31, -7.75) projected
  arc A13 (-31.5, -8.25) -> (-31, -7.75) centre (-31.5, -7.75) ccw projected
  line L15 (-31.5, -8.25) -> (-35.5, -8.25) projected
  arc A14 (-36, -7.75) -> (-35.5, -8.25) centre (-35.5, -7.75) ccw projected
  line L16 (-36, -7.75) -> (-36, -0.5) projected
  arc A15 (-36, -0.5) -> (-36.5, 0) centre (-36.5, -0.5) ccw projected
  line L17 (-49.5, 0) -> (-36.5, 0) projected
  arc A16 (-49.5, 0) -> (-50, -0.5) centre (-49.5, -0.5) ccw projected
  line L18 (-50, -49.5) -> (-50, -0.5) projected
  arc A17 (-50, -49.5) -> (-49.5, -50) centre (-49.5, -49.5) ccw projected
  line L19 (-36.5, -50) -> (-49.5, -50) projected
  circle A18 centre (-8.9896, -21.58) radius 0.55 projected
  circle A19 centre (-8.9896, -24.12) radius 0.55 projected
  circle A20 centre (-8.9896, -19.04) radius 0.55 projected
  circle A21 centre (-8.9896, -26.66) radius 0.55 projected
  point P0 (0, 0)
properties part number "PCB_GORNE"
